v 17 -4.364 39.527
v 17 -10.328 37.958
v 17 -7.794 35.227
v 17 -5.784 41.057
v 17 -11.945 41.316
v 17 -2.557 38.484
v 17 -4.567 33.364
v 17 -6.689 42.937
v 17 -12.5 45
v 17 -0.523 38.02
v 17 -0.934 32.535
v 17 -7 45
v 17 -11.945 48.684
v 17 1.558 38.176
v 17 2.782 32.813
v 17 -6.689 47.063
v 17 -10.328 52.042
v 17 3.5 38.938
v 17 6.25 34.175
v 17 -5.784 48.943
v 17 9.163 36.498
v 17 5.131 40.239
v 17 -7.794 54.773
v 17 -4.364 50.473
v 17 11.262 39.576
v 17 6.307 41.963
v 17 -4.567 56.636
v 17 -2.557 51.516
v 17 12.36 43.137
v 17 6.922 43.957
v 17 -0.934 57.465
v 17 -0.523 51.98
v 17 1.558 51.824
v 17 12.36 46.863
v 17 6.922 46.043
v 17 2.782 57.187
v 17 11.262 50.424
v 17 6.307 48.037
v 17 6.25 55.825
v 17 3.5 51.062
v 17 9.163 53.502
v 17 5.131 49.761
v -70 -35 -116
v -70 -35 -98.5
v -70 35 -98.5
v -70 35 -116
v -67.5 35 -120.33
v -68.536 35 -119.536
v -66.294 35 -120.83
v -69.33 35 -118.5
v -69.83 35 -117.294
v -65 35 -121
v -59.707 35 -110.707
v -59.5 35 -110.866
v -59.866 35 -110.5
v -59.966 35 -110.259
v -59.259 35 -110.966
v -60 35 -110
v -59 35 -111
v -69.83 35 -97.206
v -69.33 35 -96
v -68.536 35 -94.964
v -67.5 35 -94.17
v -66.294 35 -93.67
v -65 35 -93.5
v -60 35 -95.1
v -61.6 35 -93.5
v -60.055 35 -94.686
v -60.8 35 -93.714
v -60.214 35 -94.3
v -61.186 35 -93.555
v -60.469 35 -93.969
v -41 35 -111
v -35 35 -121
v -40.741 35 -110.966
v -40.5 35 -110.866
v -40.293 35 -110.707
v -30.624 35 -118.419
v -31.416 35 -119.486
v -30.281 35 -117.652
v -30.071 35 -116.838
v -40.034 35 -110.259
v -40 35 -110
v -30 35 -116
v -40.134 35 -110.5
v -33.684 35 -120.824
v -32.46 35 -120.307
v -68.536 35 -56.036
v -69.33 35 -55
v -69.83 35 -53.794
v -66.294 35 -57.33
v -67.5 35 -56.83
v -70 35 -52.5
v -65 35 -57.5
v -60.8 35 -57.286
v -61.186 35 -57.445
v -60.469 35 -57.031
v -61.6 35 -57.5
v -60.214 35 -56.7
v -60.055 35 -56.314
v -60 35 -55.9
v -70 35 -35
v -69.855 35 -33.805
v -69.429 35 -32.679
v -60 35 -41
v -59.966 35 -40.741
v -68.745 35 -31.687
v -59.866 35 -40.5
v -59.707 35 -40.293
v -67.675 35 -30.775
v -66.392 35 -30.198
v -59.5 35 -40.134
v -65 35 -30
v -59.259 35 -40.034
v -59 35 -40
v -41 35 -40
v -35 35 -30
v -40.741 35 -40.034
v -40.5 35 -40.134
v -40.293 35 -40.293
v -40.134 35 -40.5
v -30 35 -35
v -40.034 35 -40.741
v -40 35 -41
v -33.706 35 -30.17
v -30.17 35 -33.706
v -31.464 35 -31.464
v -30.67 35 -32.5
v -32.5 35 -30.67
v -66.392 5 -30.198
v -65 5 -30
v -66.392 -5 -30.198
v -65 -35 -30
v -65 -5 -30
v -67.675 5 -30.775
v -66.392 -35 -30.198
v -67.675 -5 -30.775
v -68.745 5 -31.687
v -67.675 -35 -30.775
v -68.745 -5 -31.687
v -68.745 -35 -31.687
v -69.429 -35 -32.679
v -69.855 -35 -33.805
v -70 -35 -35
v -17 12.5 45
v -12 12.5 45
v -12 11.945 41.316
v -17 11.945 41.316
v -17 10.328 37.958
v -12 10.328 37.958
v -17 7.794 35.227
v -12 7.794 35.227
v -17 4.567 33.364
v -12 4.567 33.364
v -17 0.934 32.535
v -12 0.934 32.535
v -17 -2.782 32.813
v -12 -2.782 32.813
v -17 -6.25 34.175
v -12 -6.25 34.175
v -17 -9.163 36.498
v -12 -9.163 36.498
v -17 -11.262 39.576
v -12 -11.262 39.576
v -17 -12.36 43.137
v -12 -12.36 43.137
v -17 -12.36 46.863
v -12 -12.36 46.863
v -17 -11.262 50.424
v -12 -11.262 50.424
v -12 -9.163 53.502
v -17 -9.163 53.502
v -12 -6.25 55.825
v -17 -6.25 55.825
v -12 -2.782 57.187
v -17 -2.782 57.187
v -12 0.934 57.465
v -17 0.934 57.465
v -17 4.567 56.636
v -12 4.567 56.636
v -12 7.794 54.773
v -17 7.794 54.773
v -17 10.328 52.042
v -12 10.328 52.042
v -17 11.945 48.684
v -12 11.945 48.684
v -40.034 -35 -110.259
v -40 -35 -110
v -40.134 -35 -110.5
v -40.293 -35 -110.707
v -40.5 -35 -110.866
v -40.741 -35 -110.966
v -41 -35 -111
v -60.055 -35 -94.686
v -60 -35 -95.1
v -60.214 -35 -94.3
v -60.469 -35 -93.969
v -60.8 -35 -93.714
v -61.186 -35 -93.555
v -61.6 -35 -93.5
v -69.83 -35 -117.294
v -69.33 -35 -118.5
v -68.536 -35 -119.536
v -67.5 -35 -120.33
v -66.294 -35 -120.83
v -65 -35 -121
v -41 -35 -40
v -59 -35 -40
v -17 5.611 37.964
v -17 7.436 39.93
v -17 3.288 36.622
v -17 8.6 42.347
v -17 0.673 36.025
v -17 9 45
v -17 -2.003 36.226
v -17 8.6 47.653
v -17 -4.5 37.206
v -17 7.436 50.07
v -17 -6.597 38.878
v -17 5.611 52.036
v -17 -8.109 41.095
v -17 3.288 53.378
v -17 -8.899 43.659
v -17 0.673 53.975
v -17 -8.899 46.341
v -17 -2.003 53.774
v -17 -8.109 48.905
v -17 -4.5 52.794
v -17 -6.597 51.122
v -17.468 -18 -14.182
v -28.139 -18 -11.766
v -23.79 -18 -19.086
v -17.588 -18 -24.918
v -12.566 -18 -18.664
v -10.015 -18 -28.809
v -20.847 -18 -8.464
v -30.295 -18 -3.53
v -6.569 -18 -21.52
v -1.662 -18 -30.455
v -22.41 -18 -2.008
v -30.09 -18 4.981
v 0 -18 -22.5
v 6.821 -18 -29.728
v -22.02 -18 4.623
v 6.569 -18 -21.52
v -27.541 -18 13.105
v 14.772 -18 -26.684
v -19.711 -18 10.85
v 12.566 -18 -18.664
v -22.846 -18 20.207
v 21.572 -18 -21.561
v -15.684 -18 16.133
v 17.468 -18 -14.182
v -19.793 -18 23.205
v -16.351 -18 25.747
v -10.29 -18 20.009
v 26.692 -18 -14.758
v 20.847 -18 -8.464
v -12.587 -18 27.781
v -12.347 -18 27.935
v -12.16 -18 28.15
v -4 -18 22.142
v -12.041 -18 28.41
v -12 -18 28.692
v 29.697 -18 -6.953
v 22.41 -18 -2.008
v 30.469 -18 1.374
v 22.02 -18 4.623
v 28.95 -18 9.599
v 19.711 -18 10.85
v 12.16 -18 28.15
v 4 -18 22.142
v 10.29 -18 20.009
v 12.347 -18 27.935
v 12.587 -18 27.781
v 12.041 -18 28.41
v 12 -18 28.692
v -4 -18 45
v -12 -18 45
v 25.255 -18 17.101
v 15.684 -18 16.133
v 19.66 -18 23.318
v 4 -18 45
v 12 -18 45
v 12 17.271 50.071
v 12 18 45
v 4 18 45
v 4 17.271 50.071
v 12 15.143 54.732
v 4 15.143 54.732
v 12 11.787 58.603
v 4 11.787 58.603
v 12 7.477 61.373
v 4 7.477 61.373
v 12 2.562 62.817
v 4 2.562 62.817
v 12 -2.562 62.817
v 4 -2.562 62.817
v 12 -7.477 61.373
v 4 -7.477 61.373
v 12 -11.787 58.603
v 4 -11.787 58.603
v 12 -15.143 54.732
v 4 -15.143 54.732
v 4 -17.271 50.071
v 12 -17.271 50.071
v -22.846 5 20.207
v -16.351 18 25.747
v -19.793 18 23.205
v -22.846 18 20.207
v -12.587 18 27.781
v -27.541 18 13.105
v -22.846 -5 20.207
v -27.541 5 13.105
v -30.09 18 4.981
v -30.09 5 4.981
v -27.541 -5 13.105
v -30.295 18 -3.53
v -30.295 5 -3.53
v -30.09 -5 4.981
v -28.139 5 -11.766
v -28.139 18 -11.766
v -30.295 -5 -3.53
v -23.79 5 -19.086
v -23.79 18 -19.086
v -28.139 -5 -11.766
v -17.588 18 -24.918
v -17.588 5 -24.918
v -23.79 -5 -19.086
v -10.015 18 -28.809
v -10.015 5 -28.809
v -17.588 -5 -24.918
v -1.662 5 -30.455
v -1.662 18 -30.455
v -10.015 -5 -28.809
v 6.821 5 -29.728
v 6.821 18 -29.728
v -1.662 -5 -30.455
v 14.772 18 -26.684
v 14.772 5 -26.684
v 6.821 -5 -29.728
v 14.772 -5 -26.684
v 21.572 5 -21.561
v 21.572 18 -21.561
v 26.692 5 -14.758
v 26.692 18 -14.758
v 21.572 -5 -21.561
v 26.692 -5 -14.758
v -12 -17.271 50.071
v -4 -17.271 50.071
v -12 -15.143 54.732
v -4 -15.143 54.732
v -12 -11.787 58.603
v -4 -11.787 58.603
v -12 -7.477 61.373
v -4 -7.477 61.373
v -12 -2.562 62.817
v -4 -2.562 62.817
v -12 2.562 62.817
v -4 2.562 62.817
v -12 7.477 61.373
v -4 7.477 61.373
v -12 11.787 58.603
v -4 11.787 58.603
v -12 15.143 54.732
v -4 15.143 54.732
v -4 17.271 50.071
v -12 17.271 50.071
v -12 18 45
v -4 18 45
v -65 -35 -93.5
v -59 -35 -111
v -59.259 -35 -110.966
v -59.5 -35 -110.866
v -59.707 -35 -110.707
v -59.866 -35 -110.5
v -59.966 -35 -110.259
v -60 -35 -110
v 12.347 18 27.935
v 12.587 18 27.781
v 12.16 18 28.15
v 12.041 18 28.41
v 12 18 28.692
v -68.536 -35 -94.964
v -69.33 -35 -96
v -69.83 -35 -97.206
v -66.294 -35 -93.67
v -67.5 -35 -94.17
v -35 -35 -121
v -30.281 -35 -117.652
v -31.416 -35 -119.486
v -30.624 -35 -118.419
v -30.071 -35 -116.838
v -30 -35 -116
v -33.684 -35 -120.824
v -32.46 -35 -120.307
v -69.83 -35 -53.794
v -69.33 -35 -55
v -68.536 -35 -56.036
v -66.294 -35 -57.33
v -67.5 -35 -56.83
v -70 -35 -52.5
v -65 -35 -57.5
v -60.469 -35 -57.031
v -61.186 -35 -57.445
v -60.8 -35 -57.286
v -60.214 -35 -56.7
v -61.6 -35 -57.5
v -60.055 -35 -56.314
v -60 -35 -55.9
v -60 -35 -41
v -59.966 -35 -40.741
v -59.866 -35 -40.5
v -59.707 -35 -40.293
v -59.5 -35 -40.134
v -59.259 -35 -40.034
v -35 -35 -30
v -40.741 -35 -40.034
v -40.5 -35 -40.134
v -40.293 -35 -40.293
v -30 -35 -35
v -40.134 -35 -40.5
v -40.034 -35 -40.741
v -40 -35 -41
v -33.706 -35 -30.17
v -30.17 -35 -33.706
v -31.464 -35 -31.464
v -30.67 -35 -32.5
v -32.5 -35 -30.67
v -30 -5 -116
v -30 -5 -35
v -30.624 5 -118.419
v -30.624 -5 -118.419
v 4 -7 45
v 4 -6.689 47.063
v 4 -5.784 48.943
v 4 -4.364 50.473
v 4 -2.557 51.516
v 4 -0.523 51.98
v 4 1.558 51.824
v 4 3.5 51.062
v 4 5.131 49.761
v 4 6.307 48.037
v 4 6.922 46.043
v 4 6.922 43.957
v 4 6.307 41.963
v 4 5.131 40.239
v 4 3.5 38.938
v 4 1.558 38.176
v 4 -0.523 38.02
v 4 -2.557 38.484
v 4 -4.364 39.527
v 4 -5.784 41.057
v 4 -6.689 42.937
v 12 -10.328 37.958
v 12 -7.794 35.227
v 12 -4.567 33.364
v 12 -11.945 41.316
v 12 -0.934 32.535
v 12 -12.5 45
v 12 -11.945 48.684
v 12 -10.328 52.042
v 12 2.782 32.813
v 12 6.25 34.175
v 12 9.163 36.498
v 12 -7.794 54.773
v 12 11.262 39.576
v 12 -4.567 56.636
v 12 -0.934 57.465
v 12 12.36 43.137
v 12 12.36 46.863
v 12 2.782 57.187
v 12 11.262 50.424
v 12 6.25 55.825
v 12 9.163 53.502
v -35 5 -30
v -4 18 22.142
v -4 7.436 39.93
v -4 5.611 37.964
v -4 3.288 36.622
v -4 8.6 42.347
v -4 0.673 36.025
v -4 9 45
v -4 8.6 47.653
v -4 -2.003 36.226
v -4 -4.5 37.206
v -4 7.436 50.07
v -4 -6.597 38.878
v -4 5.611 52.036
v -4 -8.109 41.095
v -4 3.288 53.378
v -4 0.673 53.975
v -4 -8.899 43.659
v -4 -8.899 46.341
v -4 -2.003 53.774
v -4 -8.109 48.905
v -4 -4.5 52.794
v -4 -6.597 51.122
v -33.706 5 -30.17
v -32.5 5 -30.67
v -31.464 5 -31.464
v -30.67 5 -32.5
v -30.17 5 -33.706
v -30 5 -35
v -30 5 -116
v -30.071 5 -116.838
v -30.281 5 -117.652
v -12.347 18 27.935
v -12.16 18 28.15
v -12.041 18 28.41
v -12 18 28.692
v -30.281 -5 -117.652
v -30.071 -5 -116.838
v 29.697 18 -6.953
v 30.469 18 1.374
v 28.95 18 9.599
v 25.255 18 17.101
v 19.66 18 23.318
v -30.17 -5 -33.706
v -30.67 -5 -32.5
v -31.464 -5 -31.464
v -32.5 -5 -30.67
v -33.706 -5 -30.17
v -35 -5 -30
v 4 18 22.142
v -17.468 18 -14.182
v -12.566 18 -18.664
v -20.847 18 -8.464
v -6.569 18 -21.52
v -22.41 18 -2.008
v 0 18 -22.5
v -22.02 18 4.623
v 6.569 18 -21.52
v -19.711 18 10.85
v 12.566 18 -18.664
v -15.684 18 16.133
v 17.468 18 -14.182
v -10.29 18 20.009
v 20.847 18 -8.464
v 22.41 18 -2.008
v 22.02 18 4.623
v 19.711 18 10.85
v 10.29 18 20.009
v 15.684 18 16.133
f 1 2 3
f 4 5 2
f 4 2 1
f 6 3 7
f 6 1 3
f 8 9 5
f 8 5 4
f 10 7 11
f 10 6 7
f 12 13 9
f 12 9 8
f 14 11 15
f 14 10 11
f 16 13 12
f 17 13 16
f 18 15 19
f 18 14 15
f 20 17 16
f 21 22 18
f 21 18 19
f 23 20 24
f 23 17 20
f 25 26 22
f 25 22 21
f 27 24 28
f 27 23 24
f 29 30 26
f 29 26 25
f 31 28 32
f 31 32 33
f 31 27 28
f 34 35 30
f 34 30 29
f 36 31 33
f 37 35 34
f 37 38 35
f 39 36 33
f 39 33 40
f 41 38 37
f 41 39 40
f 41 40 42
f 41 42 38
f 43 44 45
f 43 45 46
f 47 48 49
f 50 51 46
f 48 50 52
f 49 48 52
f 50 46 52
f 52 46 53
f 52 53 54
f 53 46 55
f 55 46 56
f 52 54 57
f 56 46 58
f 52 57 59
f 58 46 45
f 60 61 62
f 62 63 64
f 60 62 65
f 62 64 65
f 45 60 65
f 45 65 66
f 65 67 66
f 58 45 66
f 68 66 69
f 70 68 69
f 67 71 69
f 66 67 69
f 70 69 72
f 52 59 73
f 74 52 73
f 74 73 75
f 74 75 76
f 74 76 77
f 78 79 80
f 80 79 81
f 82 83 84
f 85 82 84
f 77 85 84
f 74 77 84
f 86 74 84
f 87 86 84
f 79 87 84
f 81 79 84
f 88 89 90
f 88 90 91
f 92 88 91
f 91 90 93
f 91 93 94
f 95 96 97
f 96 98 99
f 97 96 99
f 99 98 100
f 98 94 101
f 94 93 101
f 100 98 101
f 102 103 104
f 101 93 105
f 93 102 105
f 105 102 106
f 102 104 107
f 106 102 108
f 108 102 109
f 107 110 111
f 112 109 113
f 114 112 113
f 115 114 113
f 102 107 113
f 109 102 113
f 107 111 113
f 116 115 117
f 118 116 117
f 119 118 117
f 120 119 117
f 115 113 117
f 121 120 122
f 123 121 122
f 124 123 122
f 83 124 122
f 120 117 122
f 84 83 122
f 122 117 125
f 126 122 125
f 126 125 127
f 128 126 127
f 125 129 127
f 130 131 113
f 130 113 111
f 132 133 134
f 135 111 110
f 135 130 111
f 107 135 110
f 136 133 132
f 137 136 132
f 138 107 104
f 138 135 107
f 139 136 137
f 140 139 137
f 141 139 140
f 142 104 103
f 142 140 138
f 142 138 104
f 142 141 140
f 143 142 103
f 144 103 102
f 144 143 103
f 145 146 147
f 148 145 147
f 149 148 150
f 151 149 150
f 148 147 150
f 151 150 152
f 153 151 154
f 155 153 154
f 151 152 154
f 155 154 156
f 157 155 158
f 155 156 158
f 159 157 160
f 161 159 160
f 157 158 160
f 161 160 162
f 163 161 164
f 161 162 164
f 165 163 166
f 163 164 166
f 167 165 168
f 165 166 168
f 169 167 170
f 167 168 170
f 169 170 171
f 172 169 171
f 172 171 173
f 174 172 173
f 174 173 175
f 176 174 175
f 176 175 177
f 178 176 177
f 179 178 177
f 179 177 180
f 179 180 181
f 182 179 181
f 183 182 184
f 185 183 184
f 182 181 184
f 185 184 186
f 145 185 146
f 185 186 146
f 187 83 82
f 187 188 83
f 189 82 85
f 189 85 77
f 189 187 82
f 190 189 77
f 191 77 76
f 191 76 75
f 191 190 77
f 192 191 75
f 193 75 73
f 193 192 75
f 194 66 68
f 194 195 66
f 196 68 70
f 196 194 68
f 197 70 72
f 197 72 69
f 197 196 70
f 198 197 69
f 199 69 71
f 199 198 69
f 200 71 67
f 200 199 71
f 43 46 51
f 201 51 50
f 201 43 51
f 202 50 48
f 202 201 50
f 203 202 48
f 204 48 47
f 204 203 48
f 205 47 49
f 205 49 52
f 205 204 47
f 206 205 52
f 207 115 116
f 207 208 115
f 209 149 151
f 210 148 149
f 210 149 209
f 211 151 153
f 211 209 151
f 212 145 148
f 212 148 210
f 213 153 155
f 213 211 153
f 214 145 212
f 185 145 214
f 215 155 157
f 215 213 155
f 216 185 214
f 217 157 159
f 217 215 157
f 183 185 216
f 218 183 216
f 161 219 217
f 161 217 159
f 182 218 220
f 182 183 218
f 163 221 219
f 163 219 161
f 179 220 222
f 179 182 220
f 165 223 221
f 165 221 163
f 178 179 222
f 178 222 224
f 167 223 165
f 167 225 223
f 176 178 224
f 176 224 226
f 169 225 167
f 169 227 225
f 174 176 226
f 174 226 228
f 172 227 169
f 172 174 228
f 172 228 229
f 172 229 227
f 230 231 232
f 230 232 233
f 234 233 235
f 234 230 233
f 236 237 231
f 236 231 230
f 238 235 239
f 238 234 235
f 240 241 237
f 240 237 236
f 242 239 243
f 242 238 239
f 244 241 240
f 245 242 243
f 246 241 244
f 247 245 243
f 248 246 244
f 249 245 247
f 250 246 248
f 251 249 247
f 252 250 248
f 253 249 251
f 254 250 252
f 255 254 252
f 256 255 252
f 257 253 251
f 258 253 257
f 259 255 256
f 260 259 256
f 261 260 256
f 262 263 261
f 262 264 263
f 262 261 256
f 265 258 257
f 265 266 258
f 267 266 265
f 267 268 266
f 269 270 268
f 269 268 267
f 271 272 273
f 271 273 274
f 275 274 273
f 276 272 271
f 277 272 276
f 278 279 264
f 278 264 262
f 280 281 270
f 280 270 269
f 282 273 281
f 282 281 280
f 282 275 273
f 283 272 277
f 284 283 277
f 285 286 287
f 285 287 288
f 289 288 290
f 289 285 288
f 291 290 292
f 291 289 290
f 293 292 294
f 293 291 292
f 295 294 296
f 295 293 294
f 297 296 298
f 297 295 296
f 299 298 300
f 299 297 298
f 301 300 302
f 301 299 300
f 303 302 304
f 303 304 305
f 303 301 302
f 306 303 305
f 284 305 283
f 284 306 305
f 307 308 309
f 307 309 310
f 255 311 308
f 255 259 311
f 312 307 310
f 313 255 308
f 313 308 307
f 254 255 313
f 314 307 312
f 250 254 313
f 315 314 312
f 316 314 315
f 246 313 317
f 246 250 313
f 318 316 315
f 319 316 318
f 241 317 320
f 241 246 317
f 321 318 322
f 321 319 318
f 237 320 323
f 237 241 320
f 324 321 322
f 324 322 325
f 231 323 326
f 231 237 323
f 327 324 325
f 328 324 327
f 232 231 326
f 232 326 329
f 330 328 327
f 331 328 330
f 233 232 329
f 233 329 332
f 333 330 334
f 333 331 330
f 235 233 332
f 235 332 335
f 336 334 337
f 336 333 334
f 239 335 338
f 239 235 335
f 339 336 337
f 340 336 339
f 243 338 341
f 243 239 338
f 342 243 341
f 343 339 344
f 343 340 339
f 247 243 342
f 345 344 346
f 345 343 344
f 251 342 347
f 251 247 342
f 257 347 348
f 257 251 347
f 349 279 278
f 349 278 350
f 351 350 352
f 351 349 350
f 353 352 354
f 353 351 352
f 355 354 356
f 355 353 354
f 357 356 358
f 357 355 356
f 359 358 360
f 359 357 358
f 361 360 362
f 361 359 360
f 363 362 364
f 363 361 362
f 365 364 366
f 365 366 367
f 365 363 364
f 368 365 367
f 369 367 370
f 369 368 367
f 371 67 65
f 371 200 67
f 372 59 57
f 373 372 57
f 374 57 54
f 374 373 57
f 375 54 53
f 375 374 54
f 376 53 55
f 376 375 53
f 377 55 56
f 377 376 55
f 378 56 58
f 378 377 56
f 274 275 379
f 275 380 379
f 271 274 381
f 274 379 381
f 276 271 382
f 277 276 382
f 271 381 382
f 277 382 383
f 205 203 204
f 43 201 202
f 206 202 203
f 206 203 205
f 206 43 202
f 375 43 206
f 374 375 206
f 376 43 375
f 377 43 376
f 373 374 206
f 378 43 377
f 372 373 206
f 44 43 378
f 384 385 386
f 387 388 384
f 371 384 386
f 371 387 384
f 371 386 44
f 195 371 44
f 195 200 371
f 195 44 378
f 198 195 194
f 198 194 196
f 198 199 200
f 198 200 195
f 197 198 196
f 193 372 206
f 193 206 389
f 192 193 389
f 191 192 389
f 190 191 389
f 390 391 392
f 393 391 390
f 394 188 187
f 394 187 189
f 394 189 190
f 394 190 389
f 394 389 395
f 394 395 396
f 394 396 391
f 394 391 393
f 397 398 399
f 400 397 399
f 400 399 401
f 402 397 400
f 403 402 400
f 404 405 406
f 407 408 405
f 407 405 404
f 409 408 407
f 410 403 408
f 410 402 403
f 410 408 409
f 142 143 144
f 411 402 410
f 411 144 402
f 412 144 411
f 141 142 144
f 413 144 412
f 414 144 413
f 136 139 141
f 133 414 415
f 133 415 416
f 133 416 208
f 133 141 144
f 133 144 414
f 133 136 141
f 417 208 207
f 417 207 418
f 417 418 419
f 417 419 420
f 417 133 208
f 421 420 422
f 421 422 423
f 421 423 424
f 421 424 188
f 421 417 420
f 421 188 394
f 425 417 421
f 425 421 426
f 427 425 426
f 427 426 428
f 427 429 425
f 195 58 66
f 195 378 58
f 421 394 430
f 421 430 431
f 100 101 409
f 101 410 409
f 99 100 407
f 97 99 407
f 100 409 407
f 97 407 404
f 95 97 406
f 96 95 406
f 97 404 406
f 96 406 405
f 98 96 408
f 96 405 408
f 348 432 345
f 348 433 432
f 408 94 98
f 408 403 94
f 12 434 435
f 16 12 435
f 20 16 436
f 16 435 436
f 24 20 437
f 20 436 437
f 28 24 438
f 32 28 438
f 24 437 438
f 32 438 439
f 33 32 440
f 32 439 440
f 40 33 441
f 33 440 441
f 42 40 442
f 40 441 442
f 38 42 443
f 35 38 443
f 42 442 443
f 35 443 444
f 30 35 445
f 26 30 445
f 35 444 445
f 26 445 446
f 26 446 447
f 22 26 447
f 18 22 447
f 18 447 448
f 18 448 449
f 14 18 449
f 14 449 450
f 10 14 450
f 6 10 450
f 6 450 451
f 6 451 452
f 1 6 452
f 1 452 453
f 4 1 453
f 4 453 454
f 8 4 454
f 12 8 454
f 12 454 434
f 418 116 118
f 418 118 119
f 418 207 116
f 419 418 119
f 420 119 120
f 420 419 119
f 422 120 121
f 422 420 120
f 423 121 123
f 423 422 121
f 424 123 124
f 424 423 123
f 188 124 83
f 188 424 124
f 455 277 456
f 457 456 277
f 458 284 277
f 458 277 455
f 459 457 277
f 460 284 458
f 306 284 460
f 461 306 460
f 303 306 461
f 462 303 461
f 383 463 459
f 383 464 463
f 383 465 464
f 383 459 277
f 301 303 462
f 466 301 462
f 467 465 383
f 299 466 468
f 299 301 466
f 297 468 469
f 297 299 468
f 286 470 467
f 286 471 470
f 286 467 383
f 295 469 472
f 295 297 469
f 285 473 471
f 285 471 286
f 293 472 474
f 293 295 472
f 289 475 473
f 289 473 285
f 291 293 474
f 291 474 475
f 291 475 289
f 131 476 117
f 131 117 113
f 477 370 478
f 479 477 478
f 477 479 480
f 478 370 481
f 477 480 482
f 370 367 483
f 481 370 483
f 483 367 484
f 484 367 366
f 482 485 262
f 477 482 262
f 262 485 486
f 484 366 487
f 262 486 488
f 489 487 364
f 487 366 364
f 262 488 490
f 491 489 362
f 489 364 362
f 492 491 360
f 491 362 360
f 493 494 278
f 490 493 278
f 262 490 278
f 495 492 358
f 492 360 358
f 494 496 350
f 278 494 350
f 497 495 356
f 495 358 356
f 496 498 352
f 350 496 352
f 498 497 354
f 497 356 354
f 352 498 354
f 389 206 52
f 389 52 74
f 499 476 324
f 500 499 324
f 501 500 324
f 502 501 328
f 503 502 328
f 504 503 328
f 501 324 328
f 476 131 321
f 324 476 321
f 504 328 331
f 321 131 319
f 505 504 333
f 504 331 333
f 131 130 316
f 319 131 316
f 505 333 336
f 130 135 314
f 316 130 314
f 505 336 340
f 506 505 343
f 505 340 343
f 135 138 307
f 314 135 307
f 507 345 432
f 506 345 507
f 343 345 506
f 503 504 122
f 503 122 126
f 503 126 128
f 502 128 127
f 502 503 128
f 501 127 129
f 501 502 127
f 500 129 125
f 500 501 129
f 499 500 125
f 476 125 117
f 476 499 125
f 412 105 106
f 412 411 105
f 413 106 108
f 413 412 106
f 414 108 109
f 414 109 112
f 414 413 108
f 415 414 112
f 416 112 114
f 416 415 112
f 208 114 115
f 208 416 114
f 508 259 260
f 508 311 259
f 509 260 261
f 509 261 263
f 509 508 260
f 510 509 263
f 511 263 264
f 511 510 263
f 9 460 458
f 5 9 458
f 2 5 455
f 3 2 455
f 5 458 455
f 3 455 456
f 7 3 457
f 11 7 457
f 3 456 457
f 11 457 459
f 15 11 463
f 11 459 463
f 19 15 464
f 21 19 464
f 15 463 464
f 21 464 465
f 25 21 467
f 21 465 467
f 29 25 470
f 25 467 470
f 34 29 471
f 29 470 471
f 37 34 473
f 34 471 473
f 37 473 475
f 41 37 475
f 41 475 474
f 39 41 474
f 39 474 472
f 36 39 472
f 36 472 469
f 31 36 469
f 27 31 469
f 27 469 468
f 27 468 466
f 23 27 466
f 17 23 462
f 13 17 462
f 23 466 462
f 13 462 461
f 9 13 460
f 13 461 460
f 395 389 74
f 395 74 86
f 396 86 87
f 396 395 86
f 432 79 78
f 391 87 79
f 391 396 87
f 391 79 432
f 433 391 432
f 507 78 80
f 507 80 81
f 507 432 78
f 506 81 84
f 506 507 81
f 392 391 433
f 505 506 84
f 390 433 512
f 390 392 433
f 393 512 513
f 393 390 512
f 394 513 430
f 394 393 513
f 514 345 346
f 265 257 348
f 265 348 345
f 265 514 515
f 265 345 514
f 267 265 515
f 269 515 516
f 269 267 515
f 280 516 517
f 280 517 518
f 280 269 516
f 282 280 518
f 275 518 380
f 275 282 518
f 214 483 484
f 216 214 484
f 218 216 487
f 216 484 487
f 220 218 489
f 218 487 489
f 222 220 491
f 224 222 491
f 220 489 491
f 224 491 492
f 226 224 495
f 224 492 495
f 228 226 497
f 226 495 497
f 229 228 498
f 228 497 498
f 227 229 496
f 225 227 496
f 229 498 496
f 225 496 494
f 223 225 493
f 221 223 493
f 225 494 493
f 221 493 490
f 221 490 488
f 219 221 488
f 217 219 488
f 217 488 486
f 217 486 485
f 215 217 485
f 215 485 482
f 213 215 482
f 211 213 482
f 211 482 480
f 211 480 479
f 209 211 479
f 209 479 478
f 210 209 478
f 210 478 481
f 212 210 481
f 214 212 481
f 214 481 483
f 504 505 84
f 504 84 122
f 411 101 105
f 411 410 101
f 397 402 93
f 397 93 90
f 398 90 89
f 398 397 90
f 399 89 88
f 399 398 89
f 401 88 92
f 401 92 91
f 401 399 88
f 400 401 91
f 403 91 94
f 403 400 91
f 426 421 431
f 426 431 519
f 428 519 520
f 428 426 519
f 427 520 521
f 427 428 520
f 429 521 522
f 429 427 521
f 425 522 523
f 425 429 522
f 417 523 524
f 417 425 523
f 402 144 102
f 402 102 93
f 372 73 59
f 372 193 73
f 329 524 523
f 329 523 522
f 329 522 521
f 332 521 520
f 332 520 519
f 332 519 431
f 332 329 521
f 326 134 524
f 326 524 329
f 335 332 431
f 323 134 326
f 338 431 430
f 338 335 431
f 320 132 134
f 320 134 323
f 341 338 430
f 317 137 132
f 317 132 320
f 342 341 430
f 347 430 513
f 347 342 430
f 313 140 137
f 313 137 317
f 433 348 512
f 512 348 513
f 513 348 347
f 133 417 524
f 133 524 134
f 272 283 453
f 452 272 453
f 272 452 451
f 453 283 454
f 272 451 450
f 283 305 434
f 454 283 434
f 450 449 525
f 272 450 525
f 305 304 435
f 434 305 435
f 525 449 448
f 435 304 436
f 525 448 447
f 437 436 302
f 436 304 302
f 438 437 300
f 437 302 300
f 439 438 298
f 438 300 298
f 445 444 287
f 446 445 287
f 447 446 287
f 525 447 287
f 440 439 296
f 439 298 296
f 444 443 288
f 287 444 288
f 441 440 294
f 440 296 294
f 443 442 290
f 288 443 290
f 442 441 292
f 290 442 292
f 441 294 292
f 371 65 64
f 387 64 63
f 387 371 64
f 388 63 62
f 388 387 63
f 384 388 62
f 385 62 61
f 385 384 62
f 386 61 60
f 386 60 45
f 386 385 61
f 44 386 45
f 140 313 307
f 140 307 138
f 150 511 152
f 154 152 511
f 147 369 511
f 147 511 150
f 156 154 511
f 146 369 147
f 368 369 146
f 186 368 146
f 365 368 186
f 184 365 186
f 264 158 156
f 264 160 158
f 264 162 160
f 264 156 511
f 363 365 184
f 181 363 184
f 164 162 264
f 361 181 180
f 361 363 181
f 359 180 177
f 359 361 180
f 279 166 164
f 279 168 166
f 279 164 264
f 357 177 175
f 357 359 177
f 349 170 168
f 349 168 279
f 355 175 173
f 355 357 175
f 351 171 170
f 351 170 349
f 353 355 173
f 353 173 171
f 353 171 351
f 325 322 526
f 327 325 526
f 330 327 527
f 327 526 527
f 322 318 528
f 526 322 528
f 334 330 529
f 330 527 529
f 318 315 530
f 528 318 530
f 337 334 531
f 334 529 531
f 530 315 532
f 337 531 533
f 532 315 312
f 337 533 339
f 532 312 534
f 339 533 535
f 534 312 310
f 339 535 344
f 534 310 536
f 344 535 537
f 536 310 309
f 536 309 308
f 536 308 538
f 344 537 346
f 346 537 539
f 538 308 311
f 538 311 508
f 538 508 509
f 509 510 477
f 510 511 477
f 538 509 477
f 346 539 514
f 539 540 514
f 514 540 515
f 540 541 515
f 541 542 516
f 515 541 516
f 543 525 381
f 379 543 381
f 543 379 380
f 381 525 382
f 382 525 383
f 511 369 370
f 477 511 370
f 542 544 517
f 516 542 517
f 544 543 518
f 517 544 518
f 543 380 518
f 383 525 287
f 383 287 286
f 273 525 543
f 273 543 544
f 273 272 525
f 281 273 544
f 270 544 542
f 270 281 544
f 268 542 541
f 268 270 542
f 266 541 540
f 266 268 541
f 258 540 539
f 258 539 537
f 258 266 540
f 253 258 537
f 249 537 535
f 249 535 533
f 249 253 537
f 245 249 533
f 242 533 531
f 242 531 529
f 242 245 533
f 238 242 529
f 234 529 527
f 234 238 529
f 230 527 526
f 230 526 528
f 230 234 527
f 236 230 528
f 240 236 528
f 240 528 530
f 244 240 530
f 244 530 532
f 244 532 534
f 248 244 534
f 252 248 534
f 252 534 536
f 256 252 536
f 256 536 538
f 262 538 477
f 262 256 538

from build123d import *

# Parameters (mm, degrees)
F1_DEPTH  = 18
F2_DEPTH  = 5
F3_DEPTH  = 35
F6_DEPTH  = 8
F8_DEPTH  = 8
F10_DEPTH = 5
F12_DEPTH = 5
F14_D     = 18
F14_DEPTH = 18
F14_TIP   = 5.4077455712
F16_D     = 14
F16_DEPTH = 18
F16_TIP   = 4.2060243332
F17_R     = 1
F18_R     = 1.6
F19_R     = 1


with BuildPart() as f1:
    # F0 (on Front) → F1 (new body, symmetric)
    with BuildSketch(Plane.XZ):
        with BuildLine():
            ThreePointArc((4, 22.1415898255), (0, -22.5), (-4, 22.1415898255))
            Line((-4, 22.1415898255), (-4, 45))
            Line((-4, 45), (-12, 45))
            Line((-12, 45), (-12, 28.0401497856))
            ThreePointArc((-12, 28.0401497856), (-17.8577847603, 24.7254832805), (-22.845943753, 20.2067526841))
            ThreePointArc((-22.845943753, 20.2067526841), (-17.587930353, -24.9181601628), (26.691644965, -14.7582549463))
            ThreePointArc((26.691644965, -14.7582549463), (28.8476465145, 9.9026910774), (12, 28.0401497856))
            Line((12, 28.0401497856), (12, 45))
            Line((12, 45), (4, 45))
            Line((4, 45), (4, 22.1415898255))
        make_face()
    extrude(amount=F1_DEPTH, both=True)

    # F0 (on Front) → F2 (join, symmetric)
    with BuildSketch(Plane.XZ):
        with BuildLine():
            ThreePointArc((26.691644965, -14.7582549463), (-17.587930353, -24.9181601628), (-22.845943753, 20.2067526841))
            Line((-22.845943753, 20.2067526841), (-68.7452366808, -31.6874175928))
            ThreePointArc((-68.7452366808, -31.6874175928), (-67.0539094386, -30.4413317714), (-65, -30))
            Line((-65, -30), (-35, -30))
            ThreePointArc((-35, -30), (-31.4644660941, -31.4644660941), (-30, -35))
            Line((-30, -35), (-30, -116))
            ThreePointArc((-30, -116), (-30.1585953736, -117.2493203127), (-30.6243204975, -118.4193860568))
            Line((-30.6243204975, -118.4193860568), (26.691644965, -14.7582549463))
        make_face()
    extrude(amount=F2_DEPTH, both=True)

    # F0 (on Front) → F3 (join, symmetric)
    with BuildSketch(Plane.XZ):
        with BuildLine():
            ThreePointArc((-65, -30), (-67.0539094386, -30.4413317714), (-68.7452366808, -31.6874175928))
            ThreePointArc((-68.7452366808, -31.6874175928), (-69.6757985096, -33.2288680744), (-70, -35))
            Line((-70, -35), (-70, -52.5))
            ThreePointArc((-70, -52.5), (-68.5355339059, -56.0355339059), (-65, -57.5))
            Line((-65, -57.5), (-60, -57.5))
            Line((-60, -57.5), (-60, -40))
            Line((-60, -40), (-40, -40))
            Line((-40, -40), (-40, -111))
            Line((-40, -111), (-60, -111))
            Line((-60, -111), (-60, -93.5))
            Line((-60, -93.5), (-65, -93.5))
            ThreePointArc((-65, -93.5), (-68.5355339059, -94.9644660941), (-70, -98.5))
            Line((-70, -98.5), (-70, -116))
            ThreePointArc((-70, -116), (-68.5355339059, -119.5355339059), (-65, -121))
            Line((-65, -121), (-35, -121))
            ThreePointArc((-35, -121), (-32.4600128232, -120.3067929068), (-30.6243204975, -118.4193860568))
            ThreePointArc((-30.6243204975, -118.4193860568), (-30.1585953736, -117.2493203127), (-30, -116))
            Line((-30, -116), (-30, -35))
            ThreePointArc((-30, -35), (-31.4644660941, -31.4644660941), (-35, -30))
            Line((-35, -30), (-65, -30))
        make_face()
    extrude(amount=F3_DEPTH, both=True)

    # F5 (on face) → F6 (join, through all)
    with BuildSketch(Plane.YZ.offset(12)):
        with BuildLine():
            Line((-18, 45), (18, 45))
            ThreePointArc((18, 45), (0, 63), (-18, 45))
        make_face()
    extrude(amount=-F6_DEPTH)

    # F7 (on face) → F8 (join, through all)
    with BuildSketch(Plane(origin=(-12, 0, 0), x_dir=(0, -1, 0), z_dir=(-1, 0, 0))):
        with BuildLine():
            Line((-18, 45), (18, 45))
            ThreePointArc((18, 45), (0, 63), (-18, 45))
        make_face()
    extrude(amount=-F8_DEPTH)

    # F9 (on face) → F10 (join)
    with BuildSketch(Plane(origin=(-12, 0, 0), x_dir=(0, -1, 0), z_dir=(-1, 0, 0))):
        with BuildLine():
            Line((-12.5, 45), (12.5, 45))
            ThreePointArc((12.5, 45), (0, 57.5), (-12.5, 45))
        make_face()
        with BuildLine():
            ThreePointArc((-12.5, 45), (0, 32.5), (12.5, 45))
            Line((12.5, 45), (-12.5, 45))
        make_face()
    extrude(amount=F10_DEPTH)

    # F11 (on face) → F12 (join)
    with BuildSketch(Plane.YZ.offset(12)):
        with BuildLine():
            Line((-12.5, 45), (12.5, 45))
            ThreePointArc((12.5, 45), (0, 57.5), (-12.5, 45))
        make_face()
        with BuildLine():
            ThreePointArc((-12.5, 45), (0, 32.5), (12.5, 45))
            Line((12.5, 45), (-12.5, 45))
        make_face()
    extrude(amount=F12_DEPTH)

    # F14
    with Locations(Plane(origin=(-17, 0, 0), x_dir=(0, -1, 0), z_dir=(-1, 0, 0))):
        with Locations((0, 45)):
            Hole(F14_D / 2, depth=F14_DEPTH)
            with Locations((0, 0, -(F14_DEPTH + F14_TIP / 2))):  # 118° drill point
                Cone(0, F14_D / 2, F14_TIP, mode=Mode.SUBTRACT)

    # F16
    with Locations(Plane.YZ.offset(17)):
        with Locations((0, 45)):
            Hole(F16_D / 2, depth=F16_DEPTH)
            with Locations((0, 0, -(F16_DEPTH + F16_TIP / 2))):  # 118° drill point
                Cone(0, F16_D / 2, F16_TIP, mode=Mode.SUBTRACT)

    # F17
    f17_edges = [f1.edges().sort_by_distance(p)[0] for p in [
        (-60, 0, -40),
        (-40, 0, -40),
        (-40, 0, -111),
        (-60, 0, -111),
    ]]
    fillet(f17_edges, radius=F17_R)

    # F18
    f18_edges = [f1.edges().sort_by_distance(p)[0] for p in [
        (-60, 0, -57.5),
        (-60, 0, -93.5),
    ]]
    fillet(f18_edges, radius=F18_R)

    # F19
    f19_edges = [f1.edges().sort_by_distance(p)[0] for p in [
        (12, 9, 28.04015),
        (12, -9, 28.04015),
        (-12, 9, 28.04015),
        (-12, -9, 28.04015),
    ]]
    fillet(f19_edges, radius=F19_R)


solid = f1.part
